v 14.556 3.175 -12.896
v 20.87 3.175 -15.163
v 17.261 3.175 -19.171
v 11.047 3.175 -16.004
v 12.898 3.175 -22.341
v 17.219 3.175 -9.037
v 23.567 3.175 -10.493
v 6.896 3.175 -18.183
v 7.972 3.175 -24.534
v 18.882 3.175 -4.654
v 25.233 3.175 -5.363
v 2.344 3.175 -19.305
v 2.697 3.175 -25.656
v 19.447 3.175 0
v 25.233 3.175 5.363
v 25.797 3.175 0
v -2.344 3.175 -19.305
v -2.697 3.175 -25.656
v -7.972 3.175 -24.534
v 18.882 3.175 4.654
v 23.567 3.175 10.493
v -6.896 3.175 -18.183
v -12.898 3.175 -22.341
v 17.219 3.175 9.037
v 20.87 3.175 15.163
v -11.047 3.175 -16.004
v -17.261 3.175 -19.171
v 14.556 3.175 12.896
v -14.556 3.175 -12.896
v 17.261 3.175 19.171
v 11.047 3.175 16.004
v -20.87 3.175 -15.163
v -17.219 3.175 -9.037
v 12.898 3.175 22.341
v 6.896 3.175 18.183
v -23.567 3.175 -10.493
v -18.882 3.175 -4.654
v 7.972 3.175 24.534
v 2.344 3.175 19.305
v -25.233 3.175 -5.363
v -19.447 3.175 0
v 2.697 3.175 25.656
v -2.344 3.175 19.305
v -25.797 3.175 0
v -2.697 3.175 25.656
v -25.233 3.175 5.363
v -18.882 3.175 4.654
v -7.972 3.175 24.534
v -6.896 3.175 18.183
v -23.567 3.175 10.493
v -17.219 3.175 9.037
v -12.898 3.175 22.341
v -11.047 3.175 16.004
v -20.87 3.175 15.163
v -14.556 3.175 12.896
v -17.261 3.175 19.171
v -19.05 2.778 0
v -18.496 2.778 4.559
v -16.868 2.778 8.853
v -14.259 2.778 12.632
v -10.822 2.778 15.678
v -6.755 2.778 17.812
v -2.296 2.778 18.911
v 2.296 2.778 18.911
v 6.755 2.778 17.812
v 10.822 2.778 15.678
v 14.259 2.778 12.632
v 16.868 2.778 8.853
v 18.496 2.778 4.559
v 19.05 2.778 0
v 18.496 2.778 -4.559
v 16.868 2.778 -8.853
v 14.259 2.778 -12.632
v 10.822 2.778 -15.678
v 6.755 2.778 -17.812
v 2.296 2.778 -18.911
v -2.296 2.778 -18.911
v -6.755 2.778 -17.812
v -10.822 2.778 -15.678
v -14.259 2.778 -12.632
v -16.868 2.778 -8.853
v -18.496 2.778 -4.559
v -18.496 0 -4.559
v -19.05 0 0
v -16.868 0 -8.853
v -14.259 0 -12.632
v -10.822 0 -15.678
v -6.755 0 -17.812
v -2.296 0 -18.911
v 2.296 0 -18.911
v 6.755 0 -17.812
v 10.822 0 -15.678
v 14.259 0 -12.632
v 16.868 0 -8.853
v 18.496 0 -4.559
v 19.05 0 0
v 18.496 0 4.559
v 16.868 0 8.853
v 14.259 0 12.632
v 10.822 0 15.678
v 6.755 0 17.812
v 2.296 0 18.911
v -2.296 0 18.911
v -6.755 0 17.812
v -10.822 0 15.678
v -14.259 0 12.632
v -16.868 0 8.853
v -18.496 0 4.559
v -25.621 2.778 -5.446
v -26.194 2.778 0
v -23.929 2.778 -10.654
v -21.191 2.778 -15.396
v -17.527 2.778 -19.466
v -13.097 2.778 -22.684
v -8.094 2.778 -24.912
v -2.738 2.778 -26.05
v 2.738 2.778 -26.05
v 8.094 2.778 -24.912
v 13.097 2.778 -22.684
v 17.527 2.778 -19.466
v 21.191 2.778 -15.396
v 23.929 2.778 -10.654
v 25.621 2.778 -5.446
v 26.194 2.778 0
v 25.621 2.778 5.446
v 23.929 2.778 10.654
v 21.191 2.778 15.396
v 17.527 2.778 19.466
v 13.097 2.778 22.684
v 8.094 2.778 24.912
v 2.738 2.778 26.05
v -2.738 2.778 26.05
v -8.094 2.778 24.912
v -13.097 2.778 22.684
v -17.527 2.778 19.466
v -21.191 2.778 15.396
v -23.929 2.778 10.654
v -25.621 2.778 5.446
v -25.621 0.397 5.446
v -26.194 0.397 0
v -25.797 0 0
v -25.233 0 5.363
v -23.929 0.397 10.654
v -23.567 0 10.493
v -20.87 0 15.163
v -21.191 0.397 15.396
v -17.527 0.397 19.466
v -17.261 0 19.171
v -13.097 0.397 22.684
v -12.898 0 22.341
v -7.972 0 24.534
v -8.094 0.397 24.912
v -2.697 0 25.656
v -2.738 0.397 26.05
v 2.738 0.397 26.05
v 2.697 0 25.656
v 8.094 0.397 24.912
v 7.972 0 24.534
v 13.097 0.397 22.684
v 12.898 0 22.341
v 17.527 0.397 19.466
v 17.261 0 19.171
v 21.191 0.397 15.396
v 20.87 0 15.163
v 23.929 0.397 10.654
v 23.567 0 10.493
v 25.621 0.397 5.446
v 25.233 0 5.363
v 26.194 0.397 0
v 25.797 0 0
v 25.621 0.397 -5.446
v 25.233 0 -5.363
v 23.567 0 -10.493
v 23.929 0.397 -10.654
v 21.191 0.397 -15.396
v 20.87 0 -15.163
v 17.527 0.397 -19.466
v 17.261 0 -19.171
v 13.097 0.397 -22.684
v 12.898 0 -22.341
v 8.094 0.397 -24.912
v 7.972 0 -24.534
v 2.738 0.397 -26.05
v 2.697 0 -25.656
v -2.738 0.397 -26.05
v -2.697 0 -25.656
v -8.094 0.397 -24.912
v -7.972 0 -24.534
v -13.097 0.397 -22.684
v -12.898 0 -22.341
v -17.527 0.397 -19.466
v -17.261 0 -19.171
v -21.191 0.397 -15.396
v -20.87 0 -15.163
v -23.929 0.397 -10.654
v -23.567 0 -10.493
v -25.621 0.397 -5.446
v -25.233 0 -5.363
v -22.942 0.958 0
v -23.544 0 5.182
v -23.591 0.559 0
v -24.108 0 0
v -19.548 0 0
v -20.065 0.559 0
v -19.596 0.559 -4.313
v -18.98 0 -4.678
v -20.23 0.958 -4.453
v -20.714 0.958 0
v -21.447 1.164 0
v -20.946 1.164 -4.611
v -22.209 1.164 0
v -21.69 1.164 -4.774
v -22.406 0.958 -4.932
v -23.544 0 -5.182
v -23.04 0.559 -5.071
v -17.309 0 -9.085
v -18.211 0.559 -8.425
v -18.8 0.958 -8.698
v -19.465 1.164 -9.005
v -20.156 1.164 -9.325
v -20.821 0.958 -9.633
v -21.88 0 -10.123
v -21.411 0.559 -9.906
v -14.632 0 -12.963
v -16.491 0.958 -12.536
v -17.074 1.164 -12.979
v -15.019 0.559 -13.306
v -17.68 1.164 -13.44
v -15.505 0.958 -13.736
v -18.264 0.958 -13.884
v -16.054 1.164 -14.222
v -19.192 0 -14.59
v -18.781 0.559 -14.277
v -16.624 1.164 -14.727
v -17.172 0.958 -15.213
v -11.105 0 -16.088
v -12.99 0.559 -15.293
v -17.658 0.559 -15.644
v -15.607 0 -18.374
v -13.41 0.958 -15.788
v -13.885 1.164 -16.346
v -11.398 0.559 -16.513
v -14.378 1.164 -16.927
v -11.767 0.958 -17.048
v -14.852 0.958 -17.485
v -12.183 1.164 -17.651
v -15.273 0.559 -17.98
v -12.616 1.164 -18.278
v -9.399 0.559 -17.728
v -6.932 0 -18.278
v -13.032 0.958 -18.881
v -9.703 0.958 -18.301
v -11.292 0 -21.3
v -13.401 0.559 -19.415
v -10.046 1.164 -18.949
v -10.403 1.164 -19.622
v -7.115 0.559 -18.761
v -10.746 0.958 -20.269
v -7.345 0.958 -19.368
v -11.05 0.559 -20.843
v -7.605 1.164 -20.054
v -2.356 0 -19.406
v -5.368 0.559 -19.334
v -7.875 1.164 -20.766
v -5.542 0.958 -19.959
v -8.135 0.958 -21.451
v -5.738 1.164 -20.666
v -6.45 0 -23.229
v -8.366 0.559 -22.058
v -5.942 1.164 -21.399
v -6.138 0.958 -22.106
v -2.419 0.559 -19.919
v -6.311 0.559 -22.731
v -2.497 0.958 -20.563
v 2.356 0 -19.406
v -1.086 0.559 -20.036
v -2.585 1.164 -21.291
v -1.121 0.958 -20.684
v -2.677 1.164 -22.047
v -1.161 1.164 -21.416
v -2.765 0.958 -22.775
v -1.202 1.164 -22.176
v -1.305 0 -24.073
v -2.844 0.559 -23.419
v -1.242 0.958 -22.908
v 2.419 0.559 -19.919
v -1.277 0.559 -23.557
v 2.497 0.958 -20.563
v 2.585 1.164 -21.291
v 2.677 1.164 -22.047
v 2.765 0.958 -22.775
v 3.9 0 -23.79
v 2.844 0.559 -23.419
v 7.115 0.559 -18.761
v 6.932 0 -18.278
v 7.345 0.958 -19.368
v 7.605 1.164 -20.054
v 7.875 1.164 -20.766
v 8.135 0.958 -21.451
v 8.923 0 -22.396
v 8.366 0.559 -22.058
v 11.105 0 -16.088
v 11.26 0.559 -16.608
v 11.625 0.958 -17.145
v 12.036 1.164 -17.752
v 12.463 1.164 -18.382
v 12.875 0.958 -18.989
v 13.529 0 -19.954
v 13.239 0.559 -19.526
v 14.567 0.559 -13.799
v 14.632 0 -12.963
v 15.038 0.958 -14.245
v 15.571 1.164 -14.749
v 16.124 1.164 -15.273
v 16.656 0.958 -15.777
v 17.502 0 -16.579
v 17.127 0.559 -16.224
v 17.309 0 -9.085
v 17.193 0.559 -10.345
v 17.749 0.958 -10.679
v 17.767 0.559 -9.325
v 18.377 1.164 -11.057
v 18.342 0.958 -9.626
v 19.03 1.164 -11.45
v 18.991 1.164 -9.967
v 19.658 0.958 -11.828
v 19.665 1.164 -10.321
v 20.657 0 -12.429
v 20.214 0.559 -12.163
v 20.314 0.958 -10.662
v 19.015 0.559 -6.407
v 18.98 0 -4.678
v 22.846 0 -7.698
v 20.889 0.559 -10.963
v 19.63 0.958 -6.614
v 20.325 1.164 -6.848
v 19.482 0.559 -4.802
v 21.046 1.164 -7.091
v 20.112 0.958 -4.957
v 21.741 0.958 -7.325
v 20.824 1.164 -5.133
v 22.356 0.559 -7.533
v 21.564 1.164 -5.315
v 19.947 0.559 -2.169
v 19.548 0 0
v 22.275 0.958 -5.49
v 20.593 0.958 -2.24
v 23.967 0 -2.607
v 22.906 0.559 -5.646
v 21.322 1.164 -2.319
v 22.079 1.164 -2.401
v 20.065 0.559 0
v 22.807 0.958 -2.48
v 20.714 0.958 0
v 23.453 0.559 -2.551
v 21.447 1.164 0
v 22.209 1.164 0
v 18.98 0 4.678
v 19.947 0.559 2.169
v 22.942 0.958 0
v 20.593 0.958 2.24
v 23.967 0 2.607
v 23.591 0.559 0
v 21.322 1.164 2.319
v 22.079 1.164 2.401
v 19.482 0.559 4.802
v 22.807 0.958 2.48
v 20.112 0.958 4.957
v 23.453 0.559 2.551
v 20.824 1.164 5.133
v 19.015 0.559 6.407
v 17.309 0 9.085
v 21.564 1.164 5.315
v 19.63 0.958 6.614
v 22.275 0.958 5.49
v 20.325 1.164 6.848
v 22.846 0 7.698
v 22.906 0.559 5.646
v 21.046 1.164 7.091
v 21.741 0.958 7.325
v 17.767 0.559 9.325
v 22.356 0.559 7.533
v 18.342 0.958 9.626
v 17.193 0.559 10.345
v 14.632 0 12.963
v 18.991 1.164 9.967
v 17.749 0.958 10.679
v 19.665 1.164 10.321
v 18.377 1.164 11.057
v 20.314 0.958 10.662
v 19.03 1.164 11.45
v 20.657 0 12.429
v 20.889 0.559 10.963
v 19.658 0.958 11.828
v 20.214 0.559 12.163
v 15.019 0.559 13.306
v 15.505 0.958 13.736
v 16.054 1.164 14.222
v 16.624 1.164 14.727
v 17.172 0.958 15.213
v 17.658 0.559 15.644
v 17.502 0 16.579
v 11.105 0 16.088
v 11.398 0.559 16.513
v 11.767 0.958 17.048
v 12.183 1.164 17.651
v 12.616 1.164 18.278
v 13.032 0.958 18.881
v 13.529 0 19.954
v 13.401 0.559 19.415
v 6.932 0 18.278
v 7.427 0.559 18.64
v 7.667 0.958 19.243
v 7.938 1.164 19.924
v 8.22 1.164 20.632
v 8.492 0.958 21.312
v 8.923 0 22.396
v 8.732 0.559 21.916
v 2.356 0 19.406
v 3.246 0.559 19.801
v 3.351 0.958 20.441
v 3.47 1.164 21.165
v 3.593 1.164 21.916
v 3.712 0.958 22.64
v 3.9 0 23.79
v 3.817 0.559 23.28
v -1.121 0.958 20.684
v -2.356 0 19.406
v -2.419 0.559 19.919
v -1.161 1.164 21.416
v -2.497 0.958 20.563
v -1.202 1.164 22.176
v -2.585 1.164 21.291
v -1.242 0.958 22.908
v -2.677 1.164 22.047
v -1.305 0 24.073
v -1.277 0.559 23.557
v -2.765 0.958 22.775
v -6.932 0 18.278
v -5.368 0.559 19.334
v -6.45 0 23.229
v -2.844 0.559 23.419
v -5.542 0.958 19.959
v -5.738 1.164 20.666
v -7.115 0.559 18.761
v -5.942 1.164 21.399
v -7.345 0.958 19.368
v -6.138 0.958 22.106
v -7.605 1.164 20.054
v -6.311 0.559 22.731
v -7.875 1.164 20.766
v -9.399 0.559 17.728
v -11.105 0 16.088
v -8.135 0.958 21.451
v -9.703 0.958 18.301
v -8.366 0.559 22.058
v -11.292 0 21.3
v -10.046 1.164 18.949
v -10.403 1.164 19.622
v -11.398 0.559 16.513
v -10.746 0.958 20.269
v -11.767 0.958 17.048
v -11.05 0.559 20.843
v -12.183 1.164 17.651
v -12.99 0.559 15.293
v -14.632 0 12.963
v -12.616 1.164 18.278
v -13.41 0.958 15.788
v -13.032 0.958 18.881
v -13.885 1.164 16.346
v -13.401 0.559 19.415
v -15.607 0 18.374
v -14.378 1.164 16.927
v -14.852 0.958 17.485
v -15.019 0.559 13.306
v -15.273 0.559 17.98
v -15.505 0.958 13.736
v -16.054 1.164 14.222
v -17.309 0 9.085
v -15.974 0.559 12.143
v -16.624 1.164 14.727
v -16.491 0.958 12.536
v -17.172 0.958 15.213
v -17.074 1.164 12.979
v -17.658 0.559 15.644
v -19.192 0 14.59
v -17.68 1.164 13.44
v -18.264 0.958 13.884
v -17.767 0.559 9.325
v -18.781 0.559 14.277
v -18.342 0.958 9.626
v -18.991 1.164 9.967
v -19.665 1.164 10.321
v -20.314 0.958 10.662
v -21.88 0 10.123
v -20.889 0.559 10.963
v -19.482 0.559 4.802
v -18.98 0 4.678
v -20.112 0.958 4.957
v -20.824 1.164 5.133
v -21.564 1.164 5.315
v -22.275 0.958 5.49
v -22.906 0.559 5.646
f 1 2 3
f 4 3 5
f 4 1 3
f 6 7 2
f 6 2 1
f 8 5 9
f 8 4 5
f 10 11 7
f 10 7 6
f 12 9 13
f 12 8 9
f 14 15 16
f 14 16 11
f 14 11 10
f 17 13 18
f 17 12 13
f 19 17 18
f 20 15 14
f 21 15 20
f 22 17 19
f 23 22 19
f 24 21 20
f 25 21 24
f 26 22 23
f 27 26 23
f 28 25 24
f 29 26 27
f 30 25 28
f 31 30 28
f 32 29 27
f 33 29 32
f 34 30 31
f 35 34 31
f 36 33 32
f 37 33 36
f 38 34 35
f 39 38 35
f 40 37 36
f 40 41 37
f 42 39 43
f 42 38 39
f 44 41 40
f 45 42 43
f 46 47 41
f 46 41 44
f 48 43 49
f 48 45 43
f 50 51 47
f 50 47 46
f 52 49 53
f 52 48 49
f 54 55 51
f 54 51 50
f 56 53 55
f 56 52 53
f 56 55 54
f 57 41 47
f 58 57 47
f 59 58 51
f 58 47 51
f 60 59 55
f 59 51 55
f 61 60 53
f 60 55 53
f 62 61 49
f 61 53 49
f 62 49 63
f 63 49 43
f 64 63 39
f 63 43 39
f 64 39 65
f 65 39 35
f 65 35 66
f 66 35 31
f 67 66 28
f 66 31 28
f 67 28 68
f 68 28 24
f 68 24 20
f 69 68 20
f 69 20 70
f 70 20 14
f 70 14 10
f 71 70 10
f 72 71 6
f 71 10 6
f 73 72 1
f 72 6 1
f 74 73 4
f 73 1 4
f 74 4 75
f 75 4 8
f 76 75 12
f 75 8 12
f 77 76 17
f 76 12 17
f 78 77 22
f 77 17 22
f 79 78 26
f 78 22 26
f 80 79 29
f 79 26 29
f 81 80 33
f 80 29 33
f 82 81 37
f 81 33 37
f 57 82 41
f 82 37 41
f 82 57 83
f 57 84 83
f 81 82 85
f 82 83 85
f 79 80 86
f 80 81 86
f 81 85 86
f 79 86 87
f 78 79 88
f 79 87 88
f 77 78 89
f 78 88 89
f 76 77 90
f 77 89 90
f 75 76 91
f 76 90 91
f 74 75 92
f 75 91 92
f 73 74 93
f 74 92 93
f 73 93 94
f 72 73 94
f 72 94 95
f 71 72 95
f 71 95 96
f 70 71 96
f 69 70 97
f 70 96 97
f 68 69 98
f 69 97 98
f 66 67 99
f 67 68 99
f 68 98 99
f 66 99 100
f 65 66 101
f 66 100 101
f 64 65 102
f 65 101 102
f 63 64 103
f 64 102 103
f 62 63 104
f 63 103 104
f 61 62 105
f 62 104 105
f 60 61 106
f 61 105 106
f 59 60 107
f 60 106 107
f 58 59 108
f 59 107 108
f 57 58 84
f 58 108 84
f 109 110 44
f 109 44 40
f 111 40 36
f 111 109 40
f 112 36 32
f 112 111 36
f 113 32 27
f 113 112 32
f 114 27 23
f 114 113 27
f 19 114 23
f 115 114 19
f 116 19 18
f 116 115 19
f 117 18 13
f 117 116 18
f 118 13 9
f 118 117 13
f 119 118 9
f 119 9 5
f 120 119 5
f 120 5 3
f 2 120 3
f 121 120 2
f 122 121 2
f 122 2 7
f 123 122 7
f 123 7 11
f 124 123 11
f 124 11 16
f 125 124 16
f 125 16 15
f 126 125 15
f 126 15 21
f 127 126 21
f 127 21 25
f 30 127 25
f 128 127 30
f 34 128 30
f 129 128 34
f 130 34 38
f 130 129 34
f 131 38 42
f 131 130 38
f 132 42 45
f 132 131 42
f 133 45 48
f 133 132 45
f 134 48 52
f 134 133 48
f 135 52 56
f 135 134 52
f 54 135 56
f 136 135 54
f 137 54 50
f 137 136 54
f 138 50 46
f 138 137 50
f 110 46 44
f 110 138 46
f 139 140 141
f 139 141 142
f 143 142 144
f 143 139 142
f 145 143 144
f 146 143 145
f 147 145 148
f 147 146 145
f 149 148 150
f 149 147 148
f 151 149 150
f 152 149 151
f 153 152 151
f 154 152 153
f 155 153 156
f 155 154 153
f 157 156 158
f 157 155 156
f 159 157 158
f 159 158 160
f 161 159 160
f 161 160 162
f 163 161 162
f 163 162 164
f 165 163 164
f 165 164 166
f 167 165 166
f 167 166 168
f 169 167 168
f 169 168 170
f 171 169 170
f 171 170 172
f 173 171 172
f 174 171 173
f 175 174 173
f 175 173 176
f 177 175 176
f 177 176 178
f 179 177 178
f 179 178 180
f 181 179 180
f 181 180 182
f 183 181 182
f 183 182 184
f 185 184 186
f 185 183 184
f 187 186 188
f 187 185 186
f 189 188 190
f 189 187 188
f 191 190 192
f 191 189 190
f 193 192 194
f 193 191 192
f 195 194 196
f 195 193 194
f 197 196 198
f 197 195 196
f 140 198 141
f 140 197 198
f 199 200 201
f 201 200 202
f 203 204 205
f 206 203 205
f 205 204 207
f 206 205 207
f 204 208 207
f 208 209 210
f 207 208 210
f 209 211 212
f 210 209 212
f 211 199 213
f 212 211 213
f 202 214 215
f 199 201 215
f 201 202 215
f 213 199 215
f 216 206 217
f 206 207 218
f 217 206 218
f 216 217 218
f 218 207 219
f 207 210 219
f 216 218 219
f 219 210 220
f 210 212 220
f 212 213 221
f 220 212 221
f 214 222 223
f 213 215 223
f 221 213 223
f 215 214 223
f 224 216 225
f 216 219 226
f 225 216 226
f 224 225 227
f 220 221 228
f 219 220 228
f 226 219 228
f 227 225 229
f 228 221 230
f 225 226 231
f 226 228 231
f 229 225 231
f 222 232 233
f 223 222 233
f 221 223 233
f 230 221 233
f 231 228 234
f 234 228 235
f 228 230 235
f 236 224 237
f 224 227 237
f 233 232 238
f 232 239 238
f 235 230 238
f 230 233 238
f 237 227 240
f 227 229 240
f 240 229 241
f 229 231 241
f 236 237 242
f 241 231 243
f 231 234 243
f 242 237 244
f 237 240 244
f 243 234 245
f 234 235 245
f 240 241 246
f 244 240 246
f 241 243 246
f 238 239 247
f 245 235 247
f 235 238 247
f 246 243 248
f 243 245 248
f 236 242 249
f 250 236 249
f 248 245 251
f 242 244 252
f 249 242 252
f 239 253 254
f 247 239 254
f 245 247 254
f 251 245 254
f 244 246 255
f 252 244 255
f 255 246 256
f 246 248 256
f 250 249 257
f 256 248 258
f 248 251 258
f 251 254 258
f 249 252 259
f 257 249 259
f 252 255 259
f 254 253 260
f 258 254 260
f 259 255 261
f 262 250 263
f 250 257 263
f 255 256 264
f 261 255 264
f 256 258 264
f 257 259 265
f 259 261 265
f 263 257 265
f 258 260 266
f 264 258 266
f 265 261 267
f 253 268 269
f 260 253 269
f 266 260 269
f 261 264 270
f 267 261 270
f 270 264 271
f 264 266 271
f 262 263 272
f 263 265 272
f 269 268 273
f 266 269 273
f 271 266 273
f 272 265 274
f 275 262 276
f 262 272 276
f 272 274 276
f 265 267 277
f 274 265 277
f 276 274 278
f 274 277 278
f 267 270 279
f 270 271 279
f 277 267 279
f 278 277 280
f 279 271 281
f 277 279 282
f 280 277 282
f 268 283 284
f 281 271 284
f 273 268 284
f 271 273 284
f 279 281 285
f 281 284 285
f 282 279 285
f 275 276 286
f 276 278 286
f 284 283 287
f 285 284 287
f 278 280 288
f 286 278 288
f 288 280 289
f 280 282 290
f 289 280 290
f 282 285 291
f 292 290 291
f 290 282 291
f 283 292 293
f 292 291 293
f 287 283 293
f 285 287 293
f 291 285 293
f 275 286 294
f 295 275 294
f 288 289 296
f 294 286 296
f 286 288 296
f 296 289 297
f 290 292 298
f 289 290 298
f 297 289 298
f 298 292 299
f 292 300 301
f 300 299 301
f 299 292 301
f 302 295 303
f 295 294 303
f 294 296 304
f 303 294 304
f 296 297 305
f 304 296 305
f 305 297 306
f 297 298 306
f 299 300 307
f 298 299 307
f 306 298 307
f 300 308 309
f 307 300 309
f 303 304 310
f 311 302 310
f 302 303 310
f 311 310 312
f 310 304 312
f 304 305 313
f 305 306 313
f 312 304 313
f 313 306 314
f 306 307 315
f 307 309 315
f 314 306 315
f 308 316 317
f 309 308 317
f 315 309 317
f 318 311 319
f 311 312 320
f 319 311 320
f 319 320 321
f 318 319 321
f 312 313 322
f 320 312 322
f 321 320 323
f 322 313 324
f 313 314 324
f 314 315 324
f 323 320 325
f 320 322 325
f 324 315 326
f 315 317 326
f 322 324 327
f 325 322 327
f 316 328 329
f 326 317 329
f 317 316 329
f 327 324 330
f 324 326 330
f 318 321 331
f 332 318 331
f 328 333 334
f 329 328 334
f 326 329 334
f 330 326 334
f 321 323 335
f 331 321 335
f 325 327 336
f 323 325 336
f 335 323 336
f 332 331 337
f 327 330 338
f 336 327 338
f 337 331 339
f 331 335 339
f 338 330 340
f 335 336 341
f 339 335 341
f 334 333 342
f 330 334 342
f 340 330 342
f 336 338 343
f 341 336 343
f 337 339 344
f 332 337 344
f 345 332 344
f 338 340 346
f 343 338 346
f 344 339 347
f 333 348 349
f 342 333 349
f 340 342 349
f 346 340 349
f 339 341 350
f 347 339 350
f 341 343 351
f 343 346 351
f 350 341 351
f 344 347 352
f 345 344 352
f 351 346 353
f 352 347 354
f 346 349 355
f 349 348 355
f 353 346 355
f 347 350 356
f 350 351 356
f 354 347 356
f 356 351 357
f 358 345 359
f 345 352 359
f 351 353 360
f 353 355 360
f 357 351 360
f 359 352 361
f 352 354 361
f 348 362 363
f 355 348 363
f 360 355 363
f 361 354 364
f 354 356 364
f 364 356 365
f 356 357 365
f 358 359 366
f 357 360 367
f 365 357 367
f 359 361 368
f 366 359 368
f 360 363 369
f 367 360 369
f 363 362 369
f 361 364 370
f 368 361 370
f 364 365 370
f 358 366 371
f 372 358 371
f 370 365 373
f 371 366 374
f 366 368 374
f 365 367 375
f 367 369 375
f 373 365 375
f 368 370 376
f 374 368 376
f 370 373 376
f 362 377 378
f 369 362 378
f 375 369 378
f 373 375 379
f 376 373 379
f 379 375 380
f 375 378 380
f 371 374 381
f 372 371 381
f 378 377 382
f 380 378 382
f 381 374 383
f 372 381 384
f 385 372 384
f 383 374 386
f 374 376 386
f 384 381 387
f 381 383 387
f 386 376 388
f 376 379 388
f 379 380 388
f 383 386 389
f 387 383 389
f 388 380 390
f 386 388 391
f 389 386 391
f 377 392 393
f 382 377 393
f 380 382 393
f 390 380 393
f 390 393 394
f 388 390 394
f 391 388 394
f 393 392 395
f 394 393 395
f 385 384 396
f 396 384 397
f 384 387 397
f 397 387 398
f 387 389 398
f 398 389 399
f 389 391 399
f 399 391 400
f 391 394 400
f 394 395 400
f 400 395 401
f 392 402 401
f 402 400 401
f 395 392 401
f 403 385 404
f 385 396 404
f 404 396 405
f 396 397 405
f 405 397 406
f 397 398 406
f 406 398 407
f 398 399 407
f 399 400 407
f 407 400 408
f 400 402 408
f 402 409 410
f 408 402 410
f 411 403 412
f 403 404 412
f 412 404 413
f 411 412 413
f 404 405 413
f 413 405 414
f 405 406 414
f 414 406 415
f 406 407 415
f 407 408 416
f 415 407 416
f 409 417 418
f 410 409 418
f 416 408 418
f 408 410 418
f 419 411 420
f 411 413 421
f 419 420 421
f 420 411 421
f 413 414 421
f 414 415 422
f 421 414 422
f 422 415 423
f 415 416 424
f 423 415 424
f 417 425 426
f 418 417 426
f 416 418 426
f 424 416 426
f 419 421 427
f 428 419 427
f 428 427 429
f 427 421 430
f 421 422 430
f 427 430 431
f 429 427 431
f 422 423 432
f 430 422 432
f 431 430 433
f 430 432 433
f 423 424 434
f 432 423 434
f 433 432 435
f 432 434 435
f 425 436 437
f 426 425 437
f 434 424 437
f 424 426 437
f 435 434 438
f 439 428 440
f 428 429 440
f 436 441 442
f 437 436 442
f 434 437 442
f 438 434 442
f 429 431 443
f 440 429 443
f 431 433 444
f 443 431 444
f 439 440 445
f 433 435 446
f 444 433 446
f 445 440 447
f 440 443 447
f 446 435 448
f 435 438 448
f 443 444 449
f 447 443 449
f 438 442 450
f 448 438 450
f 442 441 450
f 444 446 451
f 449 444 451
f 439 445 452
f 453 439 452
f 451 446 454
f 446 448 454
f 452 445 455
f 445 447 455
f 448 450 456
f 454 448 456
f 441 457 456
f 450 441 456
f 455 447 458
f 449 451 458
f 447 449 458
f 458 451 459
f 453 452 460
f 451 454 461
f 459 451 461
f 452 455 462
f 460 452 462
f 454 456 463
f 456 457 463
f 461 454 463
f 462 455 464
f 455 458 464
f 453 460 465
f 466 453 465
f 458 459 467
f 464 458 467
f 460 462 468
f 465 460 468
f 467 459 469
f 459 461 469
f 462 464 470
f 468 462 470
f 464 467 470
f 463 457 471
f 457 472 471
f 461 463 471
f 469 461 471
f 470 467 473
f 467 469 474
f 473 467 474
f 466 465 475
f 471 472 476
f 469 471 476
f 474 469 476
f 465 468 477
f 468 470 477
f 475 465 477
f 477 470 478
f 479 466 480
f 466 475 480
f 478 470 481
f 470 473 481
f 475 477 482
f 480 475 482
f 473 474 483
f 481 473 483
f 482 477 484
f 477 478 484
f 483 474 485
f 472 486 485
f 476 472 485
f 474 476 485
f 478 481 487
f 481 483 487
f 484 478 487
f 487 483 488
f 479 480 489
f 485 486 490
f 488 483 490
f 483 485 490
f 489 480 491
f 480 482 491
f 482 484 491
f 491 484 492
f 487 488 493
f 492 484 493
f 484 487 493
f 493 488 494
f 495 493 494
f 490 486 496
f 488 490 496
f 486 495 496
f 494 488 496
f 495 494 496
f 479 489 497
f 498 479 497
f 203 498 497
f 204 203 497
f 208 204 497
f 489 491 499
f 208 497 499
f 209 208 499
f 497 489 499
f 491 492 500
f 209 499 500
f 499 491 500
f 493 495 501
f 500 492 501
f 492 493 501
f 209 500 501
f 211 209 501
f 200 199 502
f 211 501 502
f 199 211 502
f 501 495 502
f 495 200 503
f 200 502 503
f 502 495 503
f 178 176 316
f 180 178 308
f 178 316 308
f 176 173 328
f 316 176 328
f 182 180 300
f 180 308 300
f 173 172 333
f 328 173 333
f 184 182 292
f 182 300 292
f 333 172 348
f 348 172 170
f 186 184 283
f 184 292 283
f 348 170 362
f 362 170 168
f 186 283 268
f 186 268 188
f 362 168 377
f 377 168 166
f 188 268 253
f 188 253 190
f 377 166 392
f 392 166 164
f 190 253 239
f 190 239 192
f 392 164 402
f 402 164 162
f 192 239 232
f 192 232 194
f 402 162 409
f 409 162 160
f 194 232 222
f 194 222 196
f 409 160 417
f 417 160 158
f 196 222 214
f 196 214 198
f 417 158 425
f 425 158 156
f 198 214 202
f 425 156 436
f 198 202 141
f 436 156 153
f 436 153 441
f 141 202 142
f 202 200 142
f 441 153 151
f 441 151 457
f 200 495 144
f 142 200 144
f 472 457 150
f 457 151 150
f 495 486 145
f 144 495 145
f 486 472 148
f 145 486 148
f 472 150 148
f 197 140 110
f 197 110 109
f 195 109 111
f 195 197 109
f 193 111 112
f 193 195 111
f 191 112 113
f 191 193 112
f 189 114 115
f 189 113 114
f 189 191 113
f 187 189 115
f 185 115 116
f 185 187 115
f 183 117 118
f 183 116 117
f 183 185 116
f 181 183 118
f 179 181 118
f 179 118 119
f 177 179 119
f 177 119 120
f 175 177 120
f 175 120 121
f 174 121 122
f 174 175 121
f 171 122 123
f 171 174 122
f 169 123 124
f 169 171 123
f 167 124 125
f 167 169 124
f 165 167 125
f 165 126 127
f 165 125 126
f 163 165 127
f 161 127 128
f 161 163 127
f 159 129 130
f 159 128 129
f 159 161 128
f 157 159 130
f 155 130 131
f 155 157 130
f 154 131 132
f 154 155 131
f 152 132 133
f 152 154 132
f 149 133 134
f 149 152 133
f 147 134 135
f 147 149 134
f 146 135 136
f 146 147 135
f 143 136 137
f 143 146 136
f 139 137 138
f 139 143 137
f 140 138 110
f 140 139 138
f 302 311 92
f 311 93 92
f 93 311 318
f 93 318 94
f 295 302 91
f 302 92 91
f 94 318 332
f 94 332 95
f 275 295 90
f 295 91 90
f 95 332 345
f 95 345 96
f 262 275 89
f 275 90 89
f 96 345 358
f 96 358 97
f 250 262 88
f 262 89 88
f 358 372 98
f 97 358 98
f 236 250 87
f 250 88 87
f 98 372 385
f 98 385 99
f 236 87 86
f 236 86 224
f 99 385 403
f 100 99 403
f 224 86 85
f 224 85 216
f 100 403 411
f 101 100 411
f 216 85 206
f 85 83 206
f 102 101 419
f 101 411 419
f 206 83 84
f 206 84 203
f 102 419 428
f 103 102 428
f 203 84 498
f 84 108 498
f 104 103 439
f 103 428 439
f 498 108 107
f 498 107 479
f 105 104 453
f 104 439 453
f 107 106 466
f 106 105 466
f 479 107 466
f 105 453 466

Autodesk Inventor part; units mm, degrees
ref_plane "YZ Plane" through (0, 0, 0) normal (1, 0, 0) x (0, 1, 0)
ref_plane "XZ Plane" through (0, 0, 0) normal (0, 1, 0) x (-1, 0, 0)
ref_plane "XY Plane" through (0, 0, 0) normal (0, 0, 1) x (1, 0, 0)
sketch "Sketch1" plane through (0, 0, 0) normal (0, 1, 0) x (-1, 0, 0)
  circle A0 centre (0, 0) radius 26.1938
  circle A1 centre (0, 0) radius 19.05
  dimension "d0" = 52.3875
  dimension "d1" = 38.1
extrude "Extrusion1" add sketch "Sketch1" along normal blind 3.175
sketch "Sketch2" plane through (0, 0, 0) normal (0, 0, 1) x (1, 0, 0)
  line L0 (-21.8281, 0) -> (-21.8281, -1.5875)
  circle A0 centre (-21.8281, -1.5875) radius 2.7781
  line L1 (0, 0) -> (0, 3.175)
  line L2 (26.1938, 3.175) -> (-26.1938, 3.175) projected
  dimension "d4" = 1.5875
  dimension "d5" = 5.5563
revolve "Revolution1" cut sketch "Sketch2" angle 360 about axis through (0, 0, 0) along (0, 1, 0)
chamfer "Chamfer1" distance 0.3969 angle 45 1 edges at (26.1938, 3.175, 0)
chamfer "Chamfer2" distance 0.3969 angle 45 1 edges at (26.1938, 0, 0)
chamfer "Chamfer3" distance 0.3969 angle 45 1 edges at (19.05, 3.175, 0)
properties part number "ThrustBearing-UpperRing"
